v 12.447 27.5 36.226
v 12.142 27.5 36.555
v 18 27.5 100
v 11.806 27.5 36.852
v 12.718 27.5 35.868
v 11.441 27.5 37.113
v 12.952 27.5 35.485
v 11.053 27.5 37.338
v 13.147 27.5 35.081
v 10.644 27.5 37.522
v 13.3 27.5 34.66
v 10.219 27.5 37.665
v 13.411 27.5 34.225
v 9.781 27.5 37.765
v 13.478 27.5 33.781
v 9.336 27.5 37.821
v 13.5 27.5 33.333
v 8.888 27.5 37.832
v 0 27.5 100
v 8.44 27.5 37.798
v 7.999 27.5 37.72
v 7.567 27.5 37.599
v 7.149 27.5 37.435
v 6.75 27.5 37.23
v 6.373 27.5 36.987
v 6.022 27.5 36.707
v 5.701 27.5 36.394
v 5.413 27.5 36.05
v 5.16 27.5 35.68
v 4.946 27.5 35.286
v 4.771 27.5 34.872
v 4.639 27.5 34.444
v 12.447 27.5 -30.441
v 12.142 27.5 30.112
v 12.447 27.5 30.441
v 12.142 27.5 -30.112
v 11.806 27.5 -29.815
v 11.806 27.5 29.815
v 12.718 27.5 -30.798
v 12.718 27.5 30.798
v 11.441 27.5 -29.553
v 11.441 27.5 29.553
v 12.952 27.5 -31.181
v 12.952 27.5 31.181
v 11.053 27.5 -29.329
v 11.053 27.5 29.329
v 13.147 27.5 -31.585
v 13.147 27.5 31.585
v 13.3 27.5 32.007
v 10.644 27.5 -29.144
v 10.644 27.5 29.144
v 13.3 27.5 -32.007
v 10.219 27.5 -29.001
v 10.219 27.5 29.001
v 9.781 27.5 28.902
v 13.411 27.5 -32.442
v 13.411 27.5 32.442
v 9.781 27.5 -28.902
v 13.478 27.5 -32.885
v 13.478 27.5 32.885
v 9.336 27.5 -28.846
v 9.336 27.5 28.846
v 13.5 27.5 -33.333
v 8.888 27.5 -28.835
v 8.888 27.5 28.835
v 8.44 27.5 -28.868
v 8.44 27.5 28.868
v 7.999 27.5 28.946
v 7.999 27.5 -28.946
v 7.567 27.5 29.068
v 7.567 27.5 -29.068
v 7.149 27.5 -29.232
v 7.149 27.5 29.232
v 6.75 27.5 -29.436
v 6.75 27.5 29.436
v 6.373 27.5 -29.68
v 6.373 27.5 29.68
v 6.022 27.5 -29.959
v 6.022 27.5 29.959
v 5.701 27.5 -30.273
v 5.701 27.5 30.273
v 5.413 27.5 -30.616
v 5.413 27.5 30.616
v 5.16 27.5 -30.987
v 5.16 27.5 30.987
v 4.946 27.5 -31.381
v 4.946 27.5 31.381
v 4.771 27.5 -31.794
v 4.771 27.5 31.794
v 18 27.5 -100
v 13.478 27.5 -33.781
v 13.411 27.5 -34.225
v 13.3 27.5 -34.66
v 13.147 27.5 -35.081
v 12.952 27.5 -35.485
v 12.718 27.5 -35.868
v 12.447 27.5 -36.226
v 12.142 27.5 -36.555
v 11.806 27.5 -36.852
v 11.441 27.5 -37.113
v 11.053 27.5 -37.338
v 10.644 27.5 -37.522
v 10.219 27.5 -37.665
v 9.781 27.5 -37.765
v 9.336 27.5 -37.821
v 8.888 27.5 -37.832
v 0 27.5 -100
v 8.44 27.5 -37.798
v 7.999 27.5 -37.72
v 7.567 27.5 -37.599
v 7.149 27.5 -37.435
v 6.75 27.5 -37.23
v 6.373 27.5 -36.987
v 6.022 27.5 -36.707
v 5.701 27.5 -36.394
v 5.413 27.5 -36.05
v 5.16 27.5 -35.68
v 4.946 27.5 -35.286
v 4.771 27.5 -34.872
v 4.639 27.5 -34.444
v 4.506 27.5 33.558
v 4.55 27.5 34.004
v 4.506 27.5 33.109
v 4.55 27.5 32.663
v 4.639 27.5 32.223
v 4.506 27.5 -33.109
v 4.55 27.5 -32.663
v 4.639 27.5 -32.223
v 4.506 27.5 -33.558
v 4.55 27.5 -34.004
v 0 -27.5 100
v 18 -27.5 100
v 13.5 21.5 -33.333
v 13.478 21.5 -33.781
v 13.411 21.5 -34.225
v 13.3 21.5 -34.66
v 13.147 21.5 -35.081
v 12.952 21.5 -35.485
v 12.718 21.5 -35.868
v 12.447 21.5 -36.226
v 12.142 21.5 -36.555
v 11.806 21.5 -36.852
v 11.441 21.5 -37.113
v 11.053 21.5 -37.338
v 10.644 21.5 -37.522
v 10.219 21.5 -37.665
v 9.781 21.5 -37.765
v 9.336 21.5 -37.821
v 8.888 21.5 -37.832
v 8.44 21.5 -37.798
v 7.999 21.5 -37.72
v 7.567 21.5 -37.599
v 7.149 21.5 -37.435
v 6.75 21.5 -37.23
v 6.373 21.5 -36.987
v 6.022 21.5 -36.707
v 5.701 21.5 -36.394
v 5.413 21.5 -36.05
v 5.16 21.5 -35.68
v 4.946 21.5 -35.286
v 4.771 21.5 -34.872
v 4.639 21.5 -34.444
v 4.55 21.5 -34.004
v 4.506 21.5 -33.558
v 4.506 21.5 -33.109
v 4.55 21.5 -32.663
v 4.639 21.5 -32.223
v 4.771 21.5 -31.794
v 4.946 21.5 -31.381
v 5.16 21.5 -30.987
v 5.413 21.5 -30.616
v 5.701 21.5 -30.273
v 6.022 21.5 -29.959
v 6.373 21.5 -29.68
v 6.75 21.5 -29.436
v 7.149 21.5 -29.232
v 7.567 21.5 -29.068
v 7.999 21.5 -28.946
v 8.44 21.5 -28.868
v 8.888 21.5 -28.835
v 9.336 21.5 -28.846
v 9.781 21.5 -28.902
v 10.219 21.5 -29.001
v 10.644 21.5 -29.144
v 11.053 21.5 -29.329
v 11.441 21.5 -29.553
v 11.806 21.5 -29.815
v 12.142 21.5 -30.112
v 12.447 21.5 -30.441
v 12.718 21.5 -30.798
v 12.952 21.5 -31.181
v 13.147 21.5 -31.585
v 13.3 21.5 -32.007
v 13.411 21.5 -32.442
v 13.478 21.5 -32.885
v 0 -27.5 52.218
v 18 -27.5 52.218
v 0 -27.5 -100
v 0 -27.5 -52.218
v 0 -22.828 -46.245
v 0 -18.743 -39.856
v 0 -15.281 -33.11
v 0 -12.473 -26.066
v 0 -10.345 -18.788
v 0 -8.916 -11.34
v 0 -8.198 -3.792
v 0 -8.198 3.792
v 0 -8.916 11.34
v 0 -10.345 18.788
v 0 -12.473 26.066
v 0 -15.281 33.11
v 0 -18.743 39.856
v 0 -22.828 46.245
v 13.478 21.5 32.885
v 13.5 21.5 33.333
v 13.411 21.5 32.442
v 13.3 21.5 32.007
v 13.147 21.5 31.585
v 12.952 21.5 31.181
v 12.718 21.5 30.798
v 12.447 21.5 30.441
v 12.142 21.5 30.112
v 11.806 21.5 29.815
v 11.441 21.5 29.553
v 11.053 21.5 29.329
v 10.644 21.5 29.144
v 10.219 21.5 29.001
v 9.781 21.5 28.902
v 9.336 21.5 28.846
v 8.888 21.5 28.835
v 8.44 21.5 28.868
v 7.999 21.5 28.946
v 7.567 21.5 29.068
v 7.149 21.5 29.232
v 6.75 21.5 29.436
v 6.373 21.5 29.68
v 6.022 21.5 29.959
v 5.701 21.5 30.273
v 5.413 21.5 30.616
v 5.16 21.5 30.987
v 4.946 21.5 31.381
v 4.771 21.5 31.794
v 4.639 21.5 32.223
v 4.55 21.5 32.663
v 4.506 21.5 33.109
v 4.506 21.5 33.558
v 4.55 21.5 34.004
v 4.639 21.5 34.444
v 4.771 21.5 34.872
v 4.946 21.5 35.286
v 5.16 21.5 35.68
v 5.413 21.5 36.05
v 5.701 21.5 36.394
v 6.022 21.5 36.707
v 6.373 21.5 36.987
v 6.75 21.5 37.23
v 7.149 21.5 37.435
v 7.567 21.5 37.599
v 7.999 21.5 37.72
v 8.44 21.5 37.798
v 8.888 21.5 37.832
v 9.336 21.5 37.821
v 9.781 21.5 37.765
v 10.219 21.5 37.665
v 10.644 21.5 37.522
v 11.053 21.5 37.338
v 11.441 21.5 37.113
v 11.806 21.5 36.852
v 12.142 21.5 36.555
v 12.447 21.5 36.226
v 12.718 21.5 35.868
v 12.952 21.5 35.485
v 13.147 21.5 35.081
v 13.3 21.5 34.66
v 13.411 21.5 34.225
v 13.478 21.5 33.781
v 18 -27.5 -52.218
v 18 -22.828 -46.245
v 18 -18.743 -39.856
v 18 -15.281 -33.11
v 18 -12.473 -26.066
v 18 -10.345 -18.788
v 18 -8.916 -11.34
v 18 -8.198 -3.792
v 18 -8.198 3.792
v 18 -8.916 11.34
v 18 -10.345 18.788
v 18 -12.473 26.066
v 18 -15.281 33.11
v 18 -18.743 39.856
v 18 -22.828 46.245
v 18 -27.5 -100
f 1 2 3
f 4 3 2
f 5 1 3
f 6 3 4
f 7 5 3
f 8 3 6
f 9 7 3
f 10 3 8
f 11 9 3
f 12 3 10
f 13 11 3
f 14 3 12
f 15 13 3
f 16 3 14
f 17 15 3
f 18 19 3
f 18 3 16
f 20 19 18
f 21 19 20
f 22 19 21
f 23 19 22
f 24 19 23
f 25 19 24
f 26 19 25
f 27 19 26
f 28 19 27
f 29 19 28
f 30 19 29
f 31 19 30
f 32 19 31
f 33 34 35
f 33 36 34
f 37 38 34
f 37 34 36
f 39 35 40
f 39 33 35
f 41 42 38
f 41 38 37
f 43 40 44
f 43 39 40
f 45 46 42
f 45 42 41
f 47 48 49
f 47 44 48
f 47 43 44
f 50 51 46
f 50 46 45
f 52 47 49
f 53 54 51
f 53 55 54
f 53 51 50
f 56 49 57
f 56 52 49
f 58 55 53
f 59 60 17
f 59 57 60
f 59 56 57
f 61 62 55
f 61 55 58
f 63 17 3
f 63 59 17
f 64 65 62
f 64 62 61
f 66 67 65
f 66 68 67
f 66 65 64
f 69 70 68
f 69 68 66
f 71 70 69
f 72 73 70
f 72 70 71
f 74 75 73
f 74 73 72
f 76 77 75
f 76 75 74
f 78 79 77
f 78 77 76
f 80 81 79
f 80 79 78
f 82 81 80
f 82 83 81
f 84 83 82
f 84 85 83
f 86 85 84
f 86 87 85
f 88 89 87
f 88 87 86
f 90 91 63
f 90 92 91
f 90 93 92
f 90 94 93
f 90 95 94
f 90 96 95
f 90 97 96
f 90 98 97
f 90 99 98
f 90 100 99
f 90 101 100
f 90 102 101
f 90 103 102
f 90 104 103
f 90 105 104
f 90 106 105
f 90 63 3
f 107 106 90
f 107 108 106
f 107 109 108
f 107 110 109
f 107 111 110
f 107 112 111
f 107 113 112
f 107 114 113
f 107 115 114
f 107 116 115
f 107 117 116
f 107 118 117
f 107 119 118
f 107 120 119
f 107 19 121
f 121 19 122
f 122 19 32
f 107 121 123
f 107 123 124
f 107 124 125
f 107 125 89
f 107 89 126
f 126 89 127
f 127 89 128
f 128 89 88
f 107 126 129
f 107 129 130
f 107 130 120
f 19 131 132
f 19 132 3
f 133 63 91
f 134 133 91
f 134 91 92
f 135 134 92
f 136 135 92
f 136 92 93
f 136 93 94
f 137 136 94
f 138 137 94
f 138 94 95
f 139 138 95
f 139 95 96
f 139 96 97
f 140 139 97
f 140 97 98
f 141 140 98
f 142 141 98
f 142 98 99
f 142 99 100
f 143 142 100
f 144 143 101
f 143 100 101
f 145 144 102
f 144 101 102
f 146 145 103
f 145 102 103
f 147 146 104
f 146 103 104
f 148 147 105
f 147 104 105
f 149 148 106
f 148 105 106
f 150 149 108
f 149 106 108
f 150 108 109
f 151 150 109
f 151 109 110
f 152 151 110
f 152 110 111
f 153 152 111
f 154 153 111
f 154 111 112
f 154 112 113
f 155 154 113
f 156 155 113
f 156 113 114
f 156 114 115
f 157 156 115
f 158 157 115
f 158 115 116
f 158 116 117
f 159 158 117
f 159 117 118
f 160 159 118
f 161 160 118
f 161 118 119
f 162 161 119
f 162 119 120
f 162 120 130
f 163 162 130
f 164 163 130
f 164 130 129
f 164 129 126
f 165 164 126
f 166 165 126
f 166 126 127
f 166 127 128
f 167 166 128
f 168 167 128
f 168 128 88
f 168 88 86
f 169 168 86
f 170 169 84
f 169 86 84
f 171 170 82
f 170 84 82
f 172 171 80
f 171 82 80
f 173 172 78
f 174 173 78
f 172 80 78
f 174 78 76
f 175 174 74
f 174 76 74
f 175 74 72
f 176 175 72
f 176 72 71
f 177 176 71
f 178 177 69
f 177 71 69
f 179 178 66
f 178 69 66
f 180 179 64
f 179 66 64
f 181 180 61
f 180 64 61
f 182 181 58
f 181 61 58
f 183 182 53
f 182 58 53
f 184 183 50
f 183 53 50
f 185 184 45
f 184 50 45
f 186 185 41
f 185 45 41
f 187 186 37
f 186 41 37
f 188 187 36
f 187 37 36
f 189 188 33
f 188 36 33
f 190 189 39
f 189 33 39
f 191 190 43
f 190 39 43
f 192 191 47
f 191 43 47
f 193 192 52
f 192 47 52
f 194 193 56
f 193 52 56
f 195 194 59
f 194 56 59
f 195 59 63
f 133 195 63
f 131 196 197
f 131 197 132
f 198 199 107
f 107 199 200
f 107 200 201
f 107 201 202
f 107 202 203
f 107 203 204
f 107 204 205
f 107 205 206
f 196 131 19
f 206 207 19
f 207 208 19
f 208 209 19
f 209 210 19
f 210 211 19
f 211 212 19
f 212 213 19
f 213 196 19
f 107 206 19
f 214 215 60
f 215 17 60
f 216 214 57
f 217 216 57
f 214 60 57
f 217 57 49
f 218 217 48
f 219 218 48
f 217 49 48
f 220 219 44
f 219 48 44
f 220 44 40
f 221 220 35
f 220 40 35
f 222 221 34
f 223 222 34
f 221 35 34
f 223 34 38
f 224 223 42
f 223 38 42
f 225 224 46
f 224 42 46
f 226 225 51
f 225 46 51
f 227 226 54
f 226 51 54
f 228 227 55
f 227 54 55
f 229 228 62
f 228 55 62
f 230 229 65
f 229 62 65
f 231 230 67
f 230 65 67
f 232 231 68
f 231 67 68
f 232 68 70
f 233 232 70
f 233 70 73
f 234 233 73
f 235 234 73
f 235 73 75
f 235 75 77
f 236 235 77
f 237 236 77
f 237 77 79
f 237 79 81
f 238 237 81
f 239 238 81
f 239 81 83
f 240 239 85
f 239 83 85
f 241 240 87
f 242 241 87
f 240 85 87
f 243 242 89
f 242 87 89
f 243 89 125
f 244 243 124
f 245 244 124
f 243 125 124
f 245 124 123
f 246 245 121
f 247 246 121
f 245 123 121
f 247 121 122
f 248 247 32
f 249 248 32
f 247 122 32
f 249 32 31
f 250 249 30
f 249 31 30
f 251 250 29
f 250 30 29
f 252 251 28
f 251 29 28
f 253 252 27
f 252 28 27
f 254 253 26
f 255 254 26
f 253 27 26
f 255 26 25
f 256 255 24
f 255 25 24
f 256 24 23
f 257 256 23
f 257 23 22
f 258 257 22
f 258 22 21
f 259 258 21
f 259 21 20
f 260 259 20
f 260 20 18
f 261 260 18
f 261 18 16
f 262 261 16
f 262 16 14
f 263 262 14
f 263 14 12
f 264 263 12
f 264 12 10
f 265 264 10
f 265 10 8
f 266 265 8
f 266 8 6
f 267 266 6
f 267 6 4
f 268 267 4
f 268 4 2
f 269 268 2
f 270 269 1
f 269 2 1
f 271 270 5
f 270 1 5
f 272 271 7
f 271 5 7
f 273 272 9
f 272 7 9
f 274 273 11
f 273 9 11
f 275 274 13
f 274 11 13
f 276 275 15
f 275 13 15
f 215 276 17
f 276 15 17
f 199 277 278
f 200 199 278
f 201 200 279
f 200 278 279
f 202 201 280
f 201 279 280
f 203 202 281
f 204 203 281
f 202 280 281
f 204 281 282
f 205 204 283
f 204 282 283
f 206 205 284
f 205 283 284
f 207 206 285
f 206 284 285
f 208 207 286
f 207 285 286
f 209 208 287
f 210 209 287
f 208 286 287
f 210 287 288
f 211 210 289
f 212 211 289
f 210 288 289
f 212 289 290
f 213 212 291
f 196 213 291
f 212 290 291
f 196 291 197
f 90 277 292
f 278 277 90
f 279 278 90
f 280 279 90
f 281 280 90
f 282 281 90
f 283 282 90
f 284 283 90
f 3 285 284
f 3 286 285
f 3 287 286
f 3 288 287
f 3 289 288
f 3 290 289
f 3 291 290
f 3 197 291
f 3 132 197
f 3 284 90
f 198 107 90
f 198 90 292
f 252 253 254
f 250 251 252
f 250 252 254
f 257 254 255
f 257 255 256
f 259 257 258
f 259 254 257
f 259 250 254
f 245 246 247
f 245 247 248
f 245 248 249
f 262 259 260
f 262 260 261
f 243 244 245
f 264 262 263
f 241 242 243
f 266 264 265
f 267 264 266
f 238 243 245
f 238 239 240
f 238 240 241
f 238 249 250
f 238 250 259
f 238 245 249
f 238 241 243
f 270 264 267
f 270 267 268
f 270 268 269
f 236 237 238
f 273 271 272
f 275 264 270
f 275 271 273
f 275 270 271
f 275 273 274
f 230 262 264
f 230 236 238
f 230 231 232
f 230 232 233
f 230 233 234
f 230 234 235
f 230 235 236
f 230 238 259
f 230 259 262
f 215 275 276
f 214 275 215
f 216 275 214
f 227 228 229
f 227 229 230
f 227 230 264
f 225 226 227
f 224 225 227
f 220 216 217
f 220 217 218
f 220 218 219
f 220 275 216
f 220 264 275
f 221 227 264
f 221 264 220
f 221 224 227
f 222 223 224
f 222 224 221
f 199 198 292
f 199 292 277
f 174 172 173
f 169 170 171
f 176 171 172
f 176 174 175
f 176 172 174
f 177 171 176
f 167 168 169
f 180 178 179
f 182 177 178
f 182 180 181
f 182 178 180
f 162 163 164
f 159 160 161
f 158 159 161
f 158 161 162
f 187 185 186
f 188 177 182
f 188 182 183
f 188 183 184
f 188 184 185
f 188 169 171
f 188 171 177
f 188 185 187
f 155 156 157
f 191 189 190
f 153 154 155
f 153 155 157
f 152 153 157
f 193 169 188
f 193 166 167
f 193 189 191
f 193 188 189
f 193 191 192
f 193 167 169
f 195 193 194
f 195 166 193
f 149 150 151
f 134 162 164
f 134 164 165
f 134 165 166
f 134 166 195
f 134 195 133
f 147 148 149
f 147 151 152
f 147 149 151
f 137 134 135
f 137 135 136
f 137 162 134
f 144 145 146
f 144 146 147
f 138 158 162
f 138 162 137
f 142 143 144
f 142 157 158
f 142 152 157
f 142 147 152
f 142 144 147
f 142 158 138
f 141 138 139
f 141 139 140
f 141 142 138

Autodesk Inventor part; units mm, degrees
ref_plane "YZ Plane" through (0, 0, 0) normal (1, 0, 0) x (0, 1, 0)
ref_plane "XZ Plane" through (0, 0, 0) normal (0, 1, 0) x (-1, 0, 0)
ref_plane "XY Plane" through (0, 0, 0) normal (0, 0, 1) x (1, 0, 0)
sketch "Boceto1" plane through (0, 0, 0) normal (1, 0, 0) x (0, 1, 0)
  line L0 (27.5, -100) -> (-27.5, -100)
  line L1 (-27.5, -100) -> (-27.5, 100)
  line L2 (-27.5, 100) -> (27.5, 100)
  line L3 (27.5, 100) -> (27.5, -100)
  line L4 (27.5, -100) -> (-27.5, 100) construction
  line L5 (-27.5, -100) -> (27.5, 100) construction
  point P0 (0, 0)
  dimension "alto" = 55
  dimension "ancho" = 200
extrude "Extrusión1" add sketch "Boceto1" along normal blind 18
sketch "Boceto2" plane through (0, 27.5, 100) normal (0, 1, 0) x (1, 0, 0)
  circle A0 centre (9, 66.6667) radius 4.5
  circle A1 centre (9, 133.3333) radius 4.5
  line L0 (0, 0) -> (18, 0) projected
  line L1 (0, 200) -> (18, 200) projected
  line L2 (18, 200) -> (18, 0) projected
  point P0 (0, 100)
  dimension "d4" = 9
  dimension "d5" = 9
  dimension "alto1" = 66.6667
  dimension "d7" = 66.6667
  dimension "d8" = 9
  dimension "d9" = 9
extrude "Extrusión2" cut sketch "Boceto2" against normal blind 6
sketch "Boceto3" plane through (18, 0, 0) normal (1, 0, 0) x (0, 0, -1)
  circle A0 centre (0, -88.1077) radius 80
  line L0 (-100, 27.5) -> (-100, -27.5) projected
  point P0 (0, 0)
  dimension "radio" = 160
  dimension "d14" = 100
extrude "Extrusión3" cut sketch "Boceto3" against normal blind 18
equation "\"d4\" = 0.5 * grosor"
equation "\"d5\" = d4"
equation "\"d7\" = alto1"
equation "\"d8\" = d9"
equation "\"d9\" = 0.5 * grosor"
equation "\"d10\" = 0.333333 * grosor"
equation "\"d14\" = 0.5 * ancho"
equation "\"d15\" = grosor"
equation "\"grosor\" = 18"
properties part number "soporte"
